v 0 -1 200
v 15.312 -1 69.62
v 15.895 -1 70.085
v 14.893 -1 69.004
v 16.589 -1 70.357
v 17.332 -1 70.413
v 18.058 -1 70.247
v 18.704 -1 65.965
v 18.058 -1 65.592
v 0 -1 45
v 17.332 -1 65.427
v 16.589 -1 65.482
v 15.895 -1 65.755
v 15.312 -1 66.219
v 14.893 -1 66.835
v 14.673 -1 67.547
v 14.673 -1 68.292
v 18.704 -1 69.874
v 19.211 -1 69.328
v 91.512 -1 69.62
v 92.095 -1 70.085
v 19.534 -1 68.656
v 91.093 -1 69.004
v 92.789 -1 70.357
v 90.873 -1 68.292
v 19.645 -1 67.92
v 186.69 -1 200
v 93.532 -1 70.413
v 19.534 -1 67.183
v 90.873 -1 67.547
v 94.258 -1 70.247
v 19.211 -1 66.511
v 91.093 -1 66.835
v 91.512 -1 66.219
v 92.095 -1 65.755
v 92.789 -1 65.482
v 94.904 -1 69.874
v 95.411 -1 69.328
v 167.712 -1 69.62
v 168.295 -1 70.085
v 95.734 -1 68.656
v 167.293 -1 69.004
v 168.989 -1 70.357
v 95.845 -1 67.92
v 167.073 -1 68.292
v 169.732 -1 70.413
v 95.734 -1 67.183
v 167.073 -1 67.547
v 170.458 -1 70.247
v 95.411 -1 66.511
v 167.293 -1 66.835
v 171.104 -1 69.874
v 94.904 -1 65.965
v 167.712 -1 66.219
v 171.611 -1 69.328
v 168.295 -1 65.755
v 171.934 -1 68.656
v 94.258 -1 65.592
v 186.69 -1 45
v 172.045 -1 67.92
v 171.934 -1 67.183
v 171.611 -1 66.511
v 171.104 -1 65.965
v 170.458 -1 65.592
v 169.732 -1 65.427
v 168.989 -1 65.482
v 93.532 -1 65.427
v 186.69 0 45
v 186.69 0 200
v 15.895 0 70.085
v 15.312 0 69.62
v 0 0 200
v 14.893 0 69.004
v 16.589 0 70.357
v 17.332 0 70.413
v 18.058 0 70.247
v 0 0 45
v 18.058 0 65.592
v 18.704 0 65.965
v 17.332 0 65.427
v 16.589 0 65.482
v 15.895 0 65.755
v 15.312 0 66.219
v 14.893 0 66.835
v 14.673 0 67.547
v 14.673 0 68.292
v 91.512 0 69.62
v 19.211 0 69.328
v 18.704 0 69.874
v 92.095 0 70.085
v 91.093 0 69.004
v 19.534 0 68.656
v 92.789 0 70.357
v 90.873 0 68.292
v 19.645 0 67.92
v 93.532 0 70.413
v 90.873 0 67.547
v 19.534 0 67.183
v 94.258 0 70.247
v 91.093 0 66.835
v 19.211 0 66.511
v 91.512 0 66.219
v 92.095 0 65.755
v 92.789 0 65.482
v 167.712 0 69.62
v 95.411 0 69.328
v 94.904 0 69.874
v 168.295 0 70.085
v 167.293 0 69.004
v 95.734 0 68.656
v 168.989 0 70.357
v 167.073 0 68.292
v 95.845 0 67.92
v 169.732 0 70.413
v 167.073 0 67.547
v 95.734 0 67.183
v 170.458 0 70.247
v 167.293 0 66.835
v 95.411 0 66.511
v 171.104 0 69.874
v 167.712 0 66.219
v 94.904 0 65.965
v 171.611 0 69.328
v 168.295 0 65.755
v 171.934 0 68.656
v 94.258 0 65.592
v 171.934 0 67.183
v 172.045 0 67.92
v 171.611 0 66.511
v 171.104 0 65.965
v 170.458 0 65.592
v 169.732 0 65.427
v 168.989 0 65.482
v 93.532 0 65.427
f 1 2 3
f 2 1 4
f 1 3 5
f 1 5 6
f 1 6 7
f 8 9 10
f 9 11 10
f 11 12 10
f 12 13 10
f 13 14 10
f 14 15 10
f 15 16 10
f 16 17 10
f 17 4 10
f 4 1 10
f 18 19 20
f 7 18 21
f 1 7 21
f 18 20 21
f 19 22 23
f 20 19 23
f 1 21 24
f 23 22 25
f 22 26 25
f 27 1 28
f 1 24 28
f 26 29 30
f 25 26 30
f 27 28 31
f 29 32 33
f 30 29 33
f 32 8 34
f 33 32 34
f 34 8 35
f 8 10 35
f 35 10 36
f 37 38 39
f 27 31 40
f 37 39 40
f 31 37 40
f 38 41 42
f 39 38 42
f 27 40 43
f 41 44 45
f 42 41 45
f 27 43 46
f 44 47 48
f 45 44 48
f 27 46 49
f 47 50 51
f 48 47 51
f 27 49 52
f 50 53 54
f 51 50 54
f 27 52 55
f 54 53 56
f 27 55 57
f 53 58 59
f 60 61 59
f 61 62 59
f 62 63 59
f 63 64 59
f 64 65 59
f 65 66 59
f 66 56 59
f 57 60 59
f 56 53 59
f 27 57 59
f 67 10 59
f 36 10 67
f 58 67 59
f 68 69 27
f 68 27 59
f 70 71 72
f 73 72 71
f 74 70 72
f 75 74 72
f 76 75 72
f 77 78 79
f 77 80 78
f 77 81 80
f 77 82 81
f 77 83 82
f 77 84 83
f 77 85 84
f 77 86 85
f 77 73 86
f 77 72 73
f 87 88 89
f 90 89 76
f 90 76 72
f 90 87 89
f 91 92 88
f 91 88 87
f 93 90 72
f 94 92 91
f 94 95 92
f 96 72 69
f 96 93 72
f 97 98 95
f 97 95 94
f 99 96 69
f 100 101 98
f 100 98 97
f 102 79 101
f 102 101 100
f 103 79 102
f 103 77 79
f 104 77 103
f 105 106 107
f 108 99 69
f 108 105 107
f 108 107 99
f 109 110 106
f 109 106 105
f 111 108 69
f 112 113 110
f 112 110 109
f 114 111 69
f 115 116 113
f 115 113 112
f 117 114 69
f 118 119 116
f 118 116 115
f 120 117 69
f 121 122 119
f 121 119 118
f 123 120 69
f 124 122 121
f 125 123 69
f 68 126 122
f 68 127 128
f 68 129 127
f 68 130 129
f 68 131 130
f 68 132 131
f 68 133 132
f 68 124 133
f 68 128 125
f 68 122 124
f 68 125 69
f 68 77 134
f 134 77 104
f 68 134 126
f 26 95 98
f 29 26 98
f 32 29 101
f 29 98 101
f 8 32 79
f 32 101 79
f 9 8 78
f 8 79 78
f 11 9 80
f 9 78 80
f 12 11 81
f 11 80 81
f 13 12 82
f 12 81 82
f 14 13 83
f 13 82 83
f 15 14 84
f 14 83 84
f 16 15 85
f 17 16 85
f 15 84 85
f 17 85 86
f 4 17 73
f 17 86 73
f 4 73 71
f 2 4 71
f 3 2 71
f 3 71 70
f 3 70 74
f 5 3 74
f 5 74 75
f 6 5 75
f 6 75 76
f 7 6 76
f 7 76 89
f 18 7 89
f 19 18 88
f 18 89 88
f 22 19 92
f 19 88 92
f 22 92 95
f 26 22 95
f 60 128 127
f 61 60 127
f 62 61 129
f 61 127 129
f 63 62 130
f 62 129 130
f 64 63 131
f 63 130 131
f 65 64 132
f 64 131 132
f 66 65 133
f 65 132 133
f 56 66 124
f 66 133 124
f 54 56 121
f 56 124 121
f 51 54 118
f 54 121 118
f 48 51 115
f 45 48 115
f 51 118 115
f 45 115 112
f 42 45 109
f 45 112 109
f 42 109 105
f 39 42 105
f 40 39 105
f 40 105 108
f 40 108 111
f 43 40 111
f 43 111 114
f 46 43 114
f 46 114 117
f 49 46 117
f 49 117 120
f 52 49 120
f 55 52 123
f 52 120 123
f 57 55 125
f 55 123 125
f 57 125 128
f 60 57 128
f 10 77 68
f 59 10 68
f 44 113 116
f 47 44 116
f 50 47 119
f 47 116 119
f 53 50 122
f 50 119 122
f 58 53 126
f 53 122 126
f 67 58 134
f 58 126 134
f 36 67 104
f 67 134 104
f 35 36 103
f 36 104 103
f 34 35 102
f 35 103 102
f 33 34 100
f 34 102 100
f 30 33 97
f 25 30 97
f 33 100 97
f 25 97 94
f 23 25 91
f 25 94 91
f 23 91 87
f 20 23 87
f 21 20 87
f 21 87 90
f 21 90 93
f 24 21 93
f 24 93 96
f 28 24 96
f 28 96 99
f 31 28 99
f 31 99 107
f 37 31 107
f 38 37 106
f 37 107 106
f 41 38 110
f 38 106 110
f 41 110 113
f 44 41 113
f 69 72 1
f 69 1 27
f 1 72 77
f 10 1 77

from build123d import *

# Parameters (mm, degrees)
SKETCH1_W               = 186.69
SKETCH1_H               = 199.9996
SKETCH1_R               = 2.5
BOSS_EXTRUDE1_DEPTH     = 1
SKETCH2_W               = 186.69
SKETCH2_H               = 45
CUT_EXTRUDE1_DEPTH      = 1
CUT_EXTRUDE1_DEPTH_BACK = 2


with BuildPart() as part:
    # Sketch1 → Boss-Extrude1 (new body)
    with BuildSketch(Plane(origin=(0, 0, 0), x_dir=(1, 0, 0), z_dir=(0, 1, 0))):
        with Locations((93.345, -99.9998)):
            Rectangle(SKETCH1_W, SKETCH1_H)
        with Locations((169.545, -67.9196)):
            Circle(SKETCH1_R, mode=Mode.SUBTRACT)
        with Locations((17.145, -67.9196)):
            Circle(SKETCH1_R, mode=Mode.SUBTRACT)
        with Locations((93.345, -67.9196)):
            Circle(SKETCH1_R, mode=Mode.SUBTRACT)
    extrude(amount=-BOSS_EXTRUDE1_DEPTH)

    # Sketch2 → Cut-Extrude1 (cut, two sides)
    with BuildSketch(Plane(origin=(0, 0, 0), x_dir=(1, 0, 0), z_dir=(0, 1, 0))) as cut_extrude1_sk:
        with Locations((93.345, -22.5)):
            Rectangle(SKETCH2_W, SKETCH2_H)
    extrude(amount=CUT_EXTRUDE1_DEPTH, mode=Mode.SUBTRACT)
    extrude(cut_extrude1_sk.sketch, amount=-CUT_EXTRUDE1_DEPTH_BACK, mode=Mode.SUBTRACT)


solid = part.part
